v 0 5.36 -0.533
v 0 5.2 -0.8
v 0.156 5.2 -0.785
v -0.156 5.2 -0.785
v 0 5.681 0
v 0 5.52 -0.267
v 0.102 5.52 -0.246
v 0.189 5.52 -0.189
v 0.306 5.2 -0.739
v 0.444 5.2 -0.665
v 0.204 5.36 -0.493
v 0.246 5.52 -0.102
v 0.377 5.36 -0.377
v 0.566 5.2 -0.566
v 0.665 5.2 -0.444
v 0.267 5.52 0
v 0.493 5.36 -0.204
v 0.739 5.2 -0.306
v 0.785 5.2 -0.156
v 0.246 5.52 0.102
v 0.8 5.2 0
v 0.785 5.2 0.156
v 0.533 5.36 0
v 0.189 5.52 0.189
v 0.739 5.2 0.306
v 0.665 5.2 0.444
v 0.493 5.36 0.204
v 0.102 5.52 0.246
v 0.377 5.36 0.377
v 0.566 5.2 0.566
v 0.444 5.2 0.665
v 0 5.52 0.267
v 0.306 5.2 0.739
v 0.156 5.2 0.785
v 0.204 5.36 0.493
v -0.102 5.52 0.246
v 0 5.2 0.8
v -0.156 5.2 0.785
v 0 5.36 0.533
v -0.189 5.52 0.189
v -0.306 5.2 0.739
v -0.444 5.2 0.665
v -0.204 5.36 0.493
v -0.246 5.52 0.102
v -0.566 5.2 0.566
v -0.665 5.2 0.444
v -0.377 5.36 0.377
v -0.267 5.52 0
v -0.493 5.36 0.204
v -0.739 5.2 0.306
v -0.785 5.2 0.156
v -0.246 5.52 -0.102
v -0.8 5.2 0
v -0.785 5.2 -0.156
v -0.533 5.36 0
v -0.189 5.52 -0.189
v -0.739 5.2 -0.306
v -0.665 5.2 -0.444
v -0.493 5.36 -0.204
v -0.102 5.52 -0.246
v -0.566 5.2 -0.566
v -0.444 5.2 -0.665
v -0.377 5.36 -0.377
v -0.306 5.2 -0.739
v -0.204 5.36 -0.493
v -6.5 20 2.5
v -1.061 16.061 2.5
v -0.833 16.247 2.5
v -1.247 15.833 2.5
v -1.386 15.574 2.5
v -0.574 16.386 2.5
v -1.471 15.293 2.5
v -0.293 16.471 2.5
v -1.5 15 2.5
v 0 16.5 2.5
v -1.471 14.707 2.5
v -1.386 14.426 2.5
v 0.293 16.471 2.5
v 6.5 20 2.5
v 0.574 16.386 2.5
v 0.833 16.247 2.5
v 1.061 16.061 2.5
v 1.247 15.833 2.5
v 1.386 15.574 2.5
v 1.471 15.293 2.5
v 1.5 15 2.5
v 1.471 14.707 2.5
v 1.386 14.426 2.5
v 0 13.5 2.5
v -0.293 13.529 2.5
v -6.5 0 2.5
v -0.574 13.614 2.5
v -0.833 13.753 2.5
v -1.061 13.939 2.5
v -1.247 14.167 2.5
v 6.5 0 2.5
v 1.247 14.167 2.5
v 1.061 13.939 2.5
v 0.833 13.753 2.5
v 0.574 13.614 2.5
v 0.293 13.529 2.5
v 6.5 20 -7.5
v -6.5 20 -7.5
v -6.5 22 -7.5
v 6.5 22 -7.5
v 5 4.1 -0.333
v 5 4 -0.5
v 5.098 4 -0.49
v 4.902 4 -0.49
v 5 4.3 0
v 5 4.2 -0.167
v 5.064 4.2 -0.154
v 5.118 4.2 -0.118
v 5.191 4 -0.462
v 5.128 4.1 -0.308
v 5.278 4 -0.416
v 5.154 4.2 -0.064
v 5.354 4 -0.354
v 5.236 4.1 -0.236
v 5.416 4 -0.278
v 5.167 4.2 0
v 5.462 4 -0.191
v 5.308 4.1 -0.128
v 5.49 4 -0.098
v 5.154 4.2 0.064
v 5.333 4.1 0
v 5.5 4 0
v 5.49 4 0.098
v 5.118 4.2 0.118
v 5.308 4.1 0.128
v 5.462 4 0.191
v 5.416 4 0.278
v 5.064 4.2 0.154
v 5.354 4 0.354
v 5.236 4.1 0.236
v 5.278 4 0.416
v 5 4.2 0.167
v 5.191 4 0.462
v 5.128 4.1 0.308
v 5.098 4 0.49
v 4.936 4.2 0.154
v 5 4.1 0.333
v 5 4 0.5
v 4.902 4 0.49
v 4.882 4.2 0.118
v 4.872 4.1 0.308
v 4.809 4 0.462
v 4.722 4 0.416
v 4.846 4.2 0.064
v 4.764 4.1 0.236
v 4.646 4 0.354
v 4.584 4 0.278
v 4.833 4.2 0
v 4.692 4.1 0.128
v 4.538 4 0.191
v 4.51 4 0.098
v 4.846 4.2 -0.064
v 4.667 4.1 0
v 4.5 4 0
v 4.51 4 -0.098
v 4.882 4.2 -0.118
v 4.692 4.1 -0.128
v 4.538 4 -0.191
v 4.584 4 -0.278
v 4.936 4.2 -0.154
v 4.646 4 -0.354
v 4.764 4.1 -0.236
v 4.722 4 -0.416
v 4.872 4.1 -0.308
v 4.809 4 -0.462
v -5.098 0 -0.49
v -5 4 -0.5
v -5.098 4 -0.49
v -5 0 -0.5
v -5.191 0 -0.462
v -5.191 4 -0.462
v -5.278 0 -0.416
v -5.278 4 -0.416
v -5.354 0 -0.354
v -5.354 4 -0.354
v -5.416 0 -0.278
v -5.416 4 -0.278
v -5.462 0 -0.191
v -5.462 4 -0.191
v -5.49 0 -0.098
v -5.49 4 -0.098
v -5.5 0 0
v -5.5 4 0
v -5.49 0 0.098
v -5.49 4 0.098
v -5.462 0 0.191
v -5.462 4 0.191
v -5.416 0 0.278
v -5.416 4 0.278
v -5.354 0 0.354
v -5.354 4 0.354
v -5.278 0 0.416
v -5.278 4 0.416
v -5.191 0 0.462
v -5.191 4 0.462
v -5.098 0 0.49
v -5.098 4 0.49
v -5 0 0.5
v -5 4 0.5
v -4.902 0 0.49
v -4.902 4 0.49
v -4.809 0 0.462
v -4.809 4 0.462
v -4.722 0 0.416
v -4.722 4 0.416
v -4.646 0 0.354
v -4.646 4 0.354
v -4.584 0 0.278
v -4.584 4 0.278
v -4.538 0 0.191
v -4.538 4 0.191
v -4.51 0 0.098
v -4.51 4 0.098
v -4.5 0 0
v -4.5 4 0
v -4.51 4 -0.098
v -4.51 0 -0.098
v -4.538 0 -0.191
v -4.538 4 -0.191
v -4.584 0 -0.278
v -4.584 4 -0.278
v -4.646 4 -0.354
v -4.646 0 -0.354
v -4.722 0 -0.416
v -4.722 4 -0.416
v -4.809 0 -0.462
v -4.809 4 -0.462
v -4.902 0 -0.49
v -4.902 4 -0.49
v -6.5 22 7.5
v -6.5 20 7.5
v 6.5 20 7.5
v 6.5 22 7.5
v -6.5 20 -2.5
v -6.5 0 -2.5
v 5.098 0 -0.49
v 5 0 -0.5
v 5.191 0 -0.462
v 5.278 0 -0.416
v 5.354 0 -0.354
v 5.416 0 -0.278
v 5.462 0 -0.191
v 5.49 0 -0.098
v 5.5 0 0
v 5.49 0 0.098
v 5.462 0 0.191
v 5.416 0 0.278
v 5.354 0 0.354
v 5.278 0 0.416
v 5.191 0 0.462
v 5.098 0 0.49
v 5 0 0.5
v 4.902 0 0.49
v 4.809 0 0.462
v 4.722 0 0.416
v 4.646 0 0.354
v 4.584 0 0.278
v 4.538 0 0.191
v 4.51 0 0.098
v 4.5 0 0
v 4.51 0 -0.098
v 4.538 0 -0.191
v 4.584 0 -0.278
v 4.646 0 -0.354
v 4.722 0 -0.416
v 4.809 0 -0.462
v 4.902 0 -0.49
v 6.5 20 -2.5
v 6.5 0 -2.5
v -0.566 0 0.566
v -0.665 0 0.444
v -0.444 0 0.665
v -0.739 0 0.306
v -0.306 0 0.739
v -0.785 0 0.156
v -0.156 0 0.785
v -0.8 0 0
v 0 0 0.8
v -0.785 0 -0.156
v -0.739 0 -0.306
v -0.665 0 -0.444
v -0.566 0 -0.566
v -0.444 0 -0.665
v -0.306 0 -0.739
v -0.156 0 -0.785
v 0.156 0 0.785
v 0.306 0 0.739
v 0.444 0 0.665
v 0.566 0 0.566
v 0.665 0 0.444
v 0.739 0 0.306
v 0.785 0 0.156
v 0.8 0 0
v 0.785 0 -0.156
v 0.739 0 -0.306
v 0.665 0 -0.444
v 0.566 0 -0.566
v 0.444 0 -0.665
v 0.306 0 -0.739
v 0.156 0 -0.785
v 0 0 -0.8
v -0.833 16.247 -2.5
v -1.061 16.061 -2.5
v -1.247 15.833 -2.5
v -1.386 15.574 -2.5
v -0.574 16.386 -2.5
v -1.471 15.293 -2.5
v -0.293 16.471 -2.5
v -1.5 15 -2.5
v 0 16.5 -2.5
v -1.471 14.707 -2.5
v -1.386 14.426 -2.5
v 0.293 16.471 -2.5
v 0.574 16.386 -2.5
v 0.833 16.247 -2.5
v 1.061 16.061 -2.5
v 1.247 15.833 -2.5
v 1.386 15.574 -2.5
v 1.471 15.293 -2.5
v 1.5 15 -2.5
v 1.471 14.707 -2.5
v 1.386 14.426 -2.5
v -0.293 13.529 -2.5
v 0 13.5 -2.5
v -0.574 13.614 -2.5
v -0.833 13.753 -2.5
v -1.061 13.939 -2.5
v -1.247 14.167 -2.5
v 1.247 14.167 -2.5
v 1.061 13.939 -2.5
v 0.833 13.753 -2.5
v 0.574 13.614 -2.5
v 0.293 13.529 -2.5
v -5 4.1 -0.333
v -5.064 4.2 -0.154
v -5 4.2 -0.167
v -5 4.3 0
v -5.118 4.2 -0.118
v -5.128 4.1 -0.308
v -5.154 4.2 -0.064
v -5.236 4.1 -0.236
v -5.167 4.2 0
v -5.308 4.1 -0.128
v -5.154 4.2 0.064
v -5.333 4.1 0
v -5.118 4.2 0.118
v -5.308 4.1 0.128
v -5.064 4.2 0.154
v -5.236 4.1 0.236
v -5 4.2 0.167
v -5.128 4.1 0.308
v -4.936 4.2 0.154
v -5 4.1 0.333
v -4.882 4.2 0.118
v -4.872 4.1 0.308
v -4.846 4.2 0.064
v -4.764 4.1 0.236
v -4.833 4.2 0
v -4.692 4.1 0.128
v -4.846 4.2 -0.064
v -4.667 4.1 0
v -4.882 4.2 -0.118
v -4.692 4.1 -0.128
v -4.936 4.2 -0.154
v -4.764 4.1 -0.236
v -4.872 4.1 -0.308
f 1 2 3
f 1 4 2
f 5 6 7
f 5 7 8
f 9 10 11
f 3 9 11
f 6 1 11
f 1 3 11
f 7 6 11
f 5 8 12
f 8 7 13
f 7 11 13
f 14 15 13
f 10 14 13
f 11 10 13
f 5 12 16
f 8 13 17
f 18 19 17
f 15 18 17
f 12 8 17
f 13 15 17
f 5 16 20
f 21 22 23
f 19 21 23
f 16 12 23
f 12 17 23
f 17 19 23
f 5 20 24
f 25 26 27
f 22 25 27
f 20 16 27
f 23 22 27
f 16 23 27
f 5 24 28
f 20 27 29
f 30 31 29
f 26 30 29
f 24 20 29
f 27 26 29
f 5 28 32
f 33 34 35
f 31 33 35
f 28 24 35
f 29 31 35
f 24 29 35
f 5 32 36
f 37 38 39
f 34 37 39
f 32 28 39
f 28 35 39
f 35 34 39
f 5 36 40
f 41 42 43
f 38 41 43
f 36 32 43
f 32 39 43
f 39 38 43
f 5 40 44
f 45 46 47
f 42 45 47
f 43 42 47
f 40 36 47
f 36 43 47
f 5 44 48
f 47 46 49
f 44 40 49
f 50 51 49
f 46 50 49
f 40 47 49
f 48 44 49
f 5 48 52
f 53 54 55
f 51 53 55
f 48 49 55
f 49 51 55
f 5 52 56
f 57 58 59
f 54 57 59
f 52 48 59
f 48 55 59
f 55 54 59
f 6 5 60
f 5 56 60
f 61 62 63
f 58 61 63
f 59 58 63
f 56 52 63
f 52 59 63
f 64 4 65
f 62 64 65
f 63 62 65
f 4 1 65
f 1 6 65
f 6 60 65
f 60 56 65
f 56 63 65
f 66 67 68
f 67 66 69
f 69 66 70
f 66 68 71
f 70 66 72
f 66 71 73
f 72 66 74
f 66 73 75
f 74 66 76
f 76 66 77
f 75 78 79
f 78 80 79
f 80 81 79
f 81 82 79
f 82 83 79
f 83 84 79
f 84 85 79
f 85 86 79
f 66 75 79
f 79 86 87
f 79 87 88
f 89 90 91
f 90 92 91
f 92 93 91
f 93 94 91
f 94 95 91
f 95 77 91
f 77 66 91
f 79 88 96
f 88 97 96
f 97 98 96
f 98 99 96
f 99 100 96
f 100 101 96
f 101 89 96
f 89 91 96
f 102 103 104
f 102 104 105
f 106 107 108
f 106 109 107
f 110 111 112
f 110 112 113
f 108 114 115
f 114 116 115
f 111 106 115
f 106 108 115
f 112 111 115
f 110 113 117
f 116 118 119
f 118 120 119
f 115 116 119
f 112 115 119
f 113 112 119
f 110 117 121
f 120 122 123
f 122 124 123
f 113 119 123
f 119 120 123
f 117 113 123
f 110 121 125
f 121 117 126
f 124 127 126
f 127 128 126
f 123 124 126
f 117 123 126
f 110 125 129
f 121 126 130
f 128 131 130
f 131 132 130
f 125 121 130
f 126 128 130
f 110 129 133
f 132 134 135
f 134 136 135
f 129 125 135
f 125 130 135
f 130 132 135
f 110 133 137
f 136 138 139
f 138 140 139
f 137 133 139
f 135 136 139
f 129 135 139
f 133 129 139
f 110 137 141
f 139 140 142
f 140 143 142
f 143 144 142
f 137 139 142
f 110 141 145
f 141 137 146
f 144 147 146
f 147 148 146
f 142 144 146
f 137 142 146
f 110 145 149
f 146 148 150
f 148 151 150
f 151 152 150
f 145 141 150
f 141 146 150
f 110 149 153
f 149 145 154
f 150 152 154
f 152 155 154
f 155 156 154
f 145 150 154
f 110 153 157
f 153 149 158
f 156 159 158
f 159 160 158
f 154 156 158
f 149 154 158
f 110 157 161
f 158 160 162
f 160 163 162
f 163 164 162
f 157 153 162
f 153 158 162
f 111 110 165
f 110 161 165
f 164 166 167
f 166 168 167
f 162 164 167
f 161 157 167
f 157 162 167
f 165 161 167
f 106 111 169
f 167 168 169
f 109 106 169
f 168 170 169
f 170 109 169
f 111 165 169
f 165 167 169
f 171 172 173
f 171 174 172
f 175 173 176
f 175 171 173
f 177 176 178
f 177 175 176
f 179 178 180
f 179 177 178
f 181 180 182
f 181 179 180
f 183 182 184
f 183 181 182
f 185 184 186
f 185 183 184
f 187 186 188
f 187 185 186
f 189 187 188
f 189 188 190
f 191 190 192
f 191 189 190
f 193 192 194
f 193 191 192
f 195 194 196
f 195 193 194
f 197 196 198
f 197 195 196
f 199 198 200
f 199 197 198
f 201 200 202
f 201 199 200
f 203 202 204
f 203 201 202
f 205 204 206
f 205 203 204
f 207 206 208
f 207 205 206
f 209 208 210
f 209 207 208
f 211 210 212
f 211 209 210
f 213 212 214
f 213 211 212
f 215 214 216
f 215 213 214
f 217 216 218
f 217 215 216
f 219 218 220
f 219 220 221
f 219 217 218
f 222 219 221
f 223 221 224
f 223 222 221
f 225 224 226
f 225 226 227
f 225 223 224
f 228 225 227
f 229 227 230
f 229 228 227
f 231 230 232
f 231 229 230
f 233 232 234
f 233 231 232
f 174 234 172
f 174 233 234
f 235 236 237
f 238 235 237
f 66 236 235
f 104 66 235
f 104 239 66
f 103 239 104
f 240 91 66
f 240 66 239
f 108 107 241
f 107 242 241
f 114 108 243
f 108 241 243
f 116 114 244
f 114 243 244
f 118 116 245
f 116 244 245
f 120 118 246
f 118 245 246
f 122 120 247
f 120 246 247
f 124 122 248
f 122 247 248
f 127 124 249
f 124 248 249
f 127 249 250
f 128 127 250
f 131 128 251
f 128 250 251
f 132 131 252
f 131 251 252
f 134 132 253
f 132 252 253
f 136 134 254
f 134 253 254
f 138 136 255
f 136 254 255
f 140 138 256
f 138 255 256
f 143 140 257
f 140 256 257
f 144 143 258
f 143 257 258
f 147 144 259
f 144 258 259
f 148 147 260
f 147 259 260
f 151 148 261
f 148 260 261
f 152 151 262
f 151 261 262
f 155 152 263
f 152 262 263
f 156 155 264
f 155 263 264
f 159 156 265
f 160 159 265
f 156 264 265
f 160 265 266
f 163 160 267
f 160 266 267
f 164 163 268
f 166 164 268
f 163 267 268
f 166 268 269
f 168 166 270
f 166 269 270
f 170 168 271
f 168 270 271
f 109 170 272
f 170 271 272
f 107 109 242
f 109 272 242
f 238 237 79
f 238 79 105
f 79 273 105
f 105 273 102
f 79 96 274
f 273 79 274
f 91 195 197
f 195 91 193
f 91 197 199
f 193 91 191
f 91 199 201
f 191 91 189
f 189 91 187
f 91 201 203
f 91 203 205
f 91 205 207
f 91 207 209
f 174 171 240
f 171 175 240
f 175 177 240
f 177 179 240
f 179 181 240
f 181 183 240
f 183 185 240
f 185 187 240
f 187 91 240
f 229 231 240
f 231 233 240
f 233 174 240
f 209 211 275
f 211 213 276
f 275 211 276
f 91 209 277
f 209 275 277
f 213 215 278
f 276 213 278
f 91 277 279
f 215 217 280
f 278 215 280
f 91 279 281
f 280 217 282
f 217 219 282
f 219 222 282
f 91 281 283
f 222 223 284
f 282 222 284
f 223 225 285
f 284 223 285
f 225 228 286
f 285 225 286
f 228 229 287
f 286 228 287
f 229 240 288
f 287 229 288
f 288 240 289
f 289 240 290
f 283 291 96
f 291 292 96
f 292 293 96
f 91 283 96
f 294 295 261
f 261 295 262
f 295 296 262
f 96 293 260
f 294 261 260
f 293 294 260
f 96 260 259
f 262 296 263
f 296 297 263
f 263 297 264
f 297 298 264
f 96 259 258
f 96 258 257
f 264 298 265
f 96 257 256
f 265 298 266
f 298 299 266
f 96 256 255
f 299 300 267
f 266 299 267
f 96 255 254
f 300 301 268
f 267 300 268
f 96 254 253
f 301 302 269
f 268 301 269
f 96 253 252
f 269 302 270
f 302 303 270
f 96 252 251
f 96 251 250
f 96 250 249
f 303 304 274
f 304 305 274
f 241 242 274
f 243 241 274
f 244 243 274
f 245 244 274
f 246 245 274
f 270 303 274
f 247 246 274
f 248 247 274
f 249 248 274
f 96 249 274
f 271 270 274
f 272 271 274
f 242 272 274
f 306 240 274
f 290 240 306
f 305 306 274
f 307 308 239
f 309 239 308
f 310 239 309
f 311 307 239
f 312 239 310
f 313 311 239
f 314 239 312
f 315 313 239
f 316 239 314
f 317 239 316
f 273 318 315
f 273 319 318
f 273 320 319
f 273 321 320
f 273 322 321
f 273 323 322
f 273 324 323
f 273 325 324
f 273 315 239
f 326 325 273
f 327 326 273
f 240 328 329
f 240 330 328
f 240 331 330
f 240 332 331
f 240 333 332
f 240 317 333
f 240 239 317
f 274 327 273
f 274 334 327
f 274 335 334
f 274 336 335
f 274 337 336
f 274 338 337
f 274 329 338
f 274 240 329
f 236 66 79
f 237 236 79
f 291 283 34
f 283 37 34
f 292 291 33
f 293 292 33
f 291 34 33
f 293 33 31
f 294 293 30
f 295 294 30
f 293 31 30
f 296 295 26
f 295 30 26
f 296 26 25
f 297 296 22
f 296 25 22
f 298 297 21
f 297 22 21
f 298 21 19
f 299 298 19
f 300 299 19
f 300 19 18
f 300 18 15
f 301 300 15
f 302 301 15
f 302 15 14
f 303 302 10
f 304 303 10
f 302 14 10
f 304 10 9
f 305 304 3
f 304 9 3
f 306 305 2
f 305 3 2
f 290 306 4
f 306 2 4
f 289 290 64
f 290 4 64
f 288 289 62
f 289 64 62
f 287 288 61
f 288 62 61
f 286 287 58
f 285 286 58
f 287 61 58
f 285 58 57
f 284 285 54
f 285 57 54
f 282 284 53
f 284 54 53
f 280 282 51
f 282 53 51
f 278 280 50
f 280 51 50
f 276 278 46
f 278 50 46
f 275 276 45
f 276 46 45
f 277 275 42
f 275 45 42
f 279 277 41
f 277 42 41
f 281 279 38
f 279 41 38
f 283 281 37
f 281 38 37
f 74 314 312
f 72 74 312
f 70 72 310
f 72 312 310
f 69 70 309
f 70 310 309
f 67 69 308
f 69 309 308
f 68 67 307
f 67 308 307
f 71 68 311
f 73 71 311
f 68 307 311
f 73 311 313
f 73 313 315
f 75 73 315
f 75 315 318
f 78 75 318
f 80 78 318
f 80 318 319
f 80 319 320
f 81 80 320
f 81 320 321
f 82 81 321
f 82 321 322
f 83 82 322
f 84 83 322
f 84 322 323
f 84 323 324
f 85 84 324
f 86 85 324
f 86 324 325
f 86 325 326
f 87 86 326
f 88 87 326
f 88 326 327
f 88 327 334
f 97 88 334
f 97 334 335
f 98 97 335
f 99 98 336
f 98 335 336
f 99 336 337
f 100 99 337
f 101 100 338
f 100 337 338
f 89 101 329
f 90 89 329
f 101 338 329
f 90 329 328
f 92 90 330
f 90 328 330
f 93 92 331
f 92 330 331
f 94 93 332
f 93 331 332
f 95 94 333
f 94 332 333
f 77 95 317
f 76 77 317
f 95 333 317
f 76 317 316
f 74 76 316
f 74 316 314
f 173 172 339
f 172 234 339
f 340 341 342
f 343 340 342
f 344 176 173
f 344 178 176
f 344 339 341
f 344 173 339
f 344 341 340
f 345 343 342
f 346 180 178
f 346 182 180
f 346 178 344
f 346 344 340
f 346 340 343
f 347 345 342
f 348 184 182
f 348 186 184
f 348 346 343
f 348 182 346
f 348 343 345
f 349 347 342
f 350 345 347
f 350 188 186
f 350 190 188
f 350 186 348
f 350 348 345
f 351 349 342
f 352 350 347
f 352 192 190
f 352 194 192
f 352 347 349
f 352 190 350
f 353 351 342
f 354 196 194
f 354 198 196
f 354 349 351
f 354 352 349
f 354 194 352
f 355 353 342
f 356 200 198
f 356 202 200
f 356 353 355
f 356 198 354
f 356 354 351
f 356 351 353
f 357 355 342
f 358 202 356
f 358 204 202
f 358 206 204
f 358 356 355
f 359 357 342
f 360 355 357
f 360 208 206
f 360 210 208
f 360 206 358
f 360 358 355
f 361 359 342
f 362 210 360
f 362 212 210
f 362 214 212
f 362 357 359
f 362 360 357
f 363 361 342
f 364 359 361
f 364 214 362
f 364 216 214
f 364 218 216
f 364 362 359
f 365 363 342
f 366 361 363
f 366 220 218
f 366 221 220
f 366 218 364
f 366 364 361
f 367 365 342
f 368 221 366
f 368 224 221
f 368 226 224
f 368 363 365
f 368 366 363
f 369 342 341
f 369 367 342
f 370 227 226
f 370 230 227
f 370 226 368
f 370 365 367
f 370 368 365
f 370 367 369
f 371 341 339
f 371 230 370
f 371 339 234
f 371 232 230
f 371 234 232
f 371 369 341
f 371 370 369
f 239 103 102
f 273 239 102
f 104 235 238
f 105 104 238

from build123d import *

# Parameters (mm, degrees)
SKETCH1_W                = 13
SKETCH1_H                = 5
BOSS_EXTRUDE1_DEPTH      = 20
M2_TAPPED_HOLE1_D        = 1.6
M2_TAPPED_HOLE1_DEPTH    = 5.2
M2_TAPPED_HOLE1_TIP      = 0.480688495
F_3_0_3_DIAMETER_HOLE1_D = 3
SKETCH7_W                = 13
SKETCH7_H                = 15
BOSS_EXTRUDE2_DEPTH      = 2


with BuildPart() as part:
    # Sketch1 → Boss-Extrude1 (new body)
    with BuildSketch(Plane(origin=(0, 0, 0), x_dir=(1, 0, 0), z_dir=(0, 1, 0))):
        Rectangle(SKETCH1_W, SKETCH1_H)
    extrude(amount=BOSS_EXTRUDE1_DEPTH)

    # M2 Tapped Hole1
    with Locations(Plane(origin=(0, 0, 0), x_dir=(0, 0, -1), z_dir=(0, -1, 0))):
        with Locations((0, 0)):
            Hole(M2_TAPPED_HOLE1_D / 2, depth=M2_TAPPED_HOLE1_DEPTH)
            with Locations((0, 0, -(M2_TAPPED_HOLE1_DEPTH + M2_TAPPED_HOLE1_TIP / 2))):  # 118° drill point
                Cone(0, M2_TAPPED_HOLE1_D / 2, M2_TAPPED_HOLE1_TIP, mode=Mode.SUBTRACT)

    # Sketch4 → Ø1.0mm Dowel Hole1 (revolve, cut)
    with BuildSketch(Plane(origin=(-5, 0, 0), x_dir=(0, 0, -1), z_dir=(1, 0, 0))):
        Polygon((0, 0), (0, 4.30043031), (0.5, 4), (0.5, 0), align=None)
    f_1_0mm_dowel_hole1 = revolve(axis=Axis((-5, -6.35, 0), (0, 1, 0)), mode=Mode.SUBTRACT)

    # Mirror1: Ø1.0mm Dowel Hole1 across plane
    add(f_1_0mm_dowel_hole1.mirror(Plane(origin=(0, 0, 0), x_dir=(0, 0, 1), z_dir=(1, 0, 0))), mode=Mode.SUBTRACT)

    # Ø3.0 (3) Diameter Hole1 (through all)
    with Locations(Plane(origin=(0, 15, 2.5), x_dir=(1, 0, 0), z_dir=(0, 0, 1))):
        with Locations((0, 0)):
            Hole(F_3_0_3_DIAMETER_HOLE1_D / 2)

    # Sketch7 → Boss-Extrude2 (add)
    with BuildSketch(Plane(origin=(0, 20, 0), x_dir=(1, 0, 0), z_dir=(0, 1, 0))):
        Rectangle(SKETCH7_W, SKETCH7_H)
    extrude(amount=BOSS_EXTRUDE2_DEPTH)


solid = part.part
